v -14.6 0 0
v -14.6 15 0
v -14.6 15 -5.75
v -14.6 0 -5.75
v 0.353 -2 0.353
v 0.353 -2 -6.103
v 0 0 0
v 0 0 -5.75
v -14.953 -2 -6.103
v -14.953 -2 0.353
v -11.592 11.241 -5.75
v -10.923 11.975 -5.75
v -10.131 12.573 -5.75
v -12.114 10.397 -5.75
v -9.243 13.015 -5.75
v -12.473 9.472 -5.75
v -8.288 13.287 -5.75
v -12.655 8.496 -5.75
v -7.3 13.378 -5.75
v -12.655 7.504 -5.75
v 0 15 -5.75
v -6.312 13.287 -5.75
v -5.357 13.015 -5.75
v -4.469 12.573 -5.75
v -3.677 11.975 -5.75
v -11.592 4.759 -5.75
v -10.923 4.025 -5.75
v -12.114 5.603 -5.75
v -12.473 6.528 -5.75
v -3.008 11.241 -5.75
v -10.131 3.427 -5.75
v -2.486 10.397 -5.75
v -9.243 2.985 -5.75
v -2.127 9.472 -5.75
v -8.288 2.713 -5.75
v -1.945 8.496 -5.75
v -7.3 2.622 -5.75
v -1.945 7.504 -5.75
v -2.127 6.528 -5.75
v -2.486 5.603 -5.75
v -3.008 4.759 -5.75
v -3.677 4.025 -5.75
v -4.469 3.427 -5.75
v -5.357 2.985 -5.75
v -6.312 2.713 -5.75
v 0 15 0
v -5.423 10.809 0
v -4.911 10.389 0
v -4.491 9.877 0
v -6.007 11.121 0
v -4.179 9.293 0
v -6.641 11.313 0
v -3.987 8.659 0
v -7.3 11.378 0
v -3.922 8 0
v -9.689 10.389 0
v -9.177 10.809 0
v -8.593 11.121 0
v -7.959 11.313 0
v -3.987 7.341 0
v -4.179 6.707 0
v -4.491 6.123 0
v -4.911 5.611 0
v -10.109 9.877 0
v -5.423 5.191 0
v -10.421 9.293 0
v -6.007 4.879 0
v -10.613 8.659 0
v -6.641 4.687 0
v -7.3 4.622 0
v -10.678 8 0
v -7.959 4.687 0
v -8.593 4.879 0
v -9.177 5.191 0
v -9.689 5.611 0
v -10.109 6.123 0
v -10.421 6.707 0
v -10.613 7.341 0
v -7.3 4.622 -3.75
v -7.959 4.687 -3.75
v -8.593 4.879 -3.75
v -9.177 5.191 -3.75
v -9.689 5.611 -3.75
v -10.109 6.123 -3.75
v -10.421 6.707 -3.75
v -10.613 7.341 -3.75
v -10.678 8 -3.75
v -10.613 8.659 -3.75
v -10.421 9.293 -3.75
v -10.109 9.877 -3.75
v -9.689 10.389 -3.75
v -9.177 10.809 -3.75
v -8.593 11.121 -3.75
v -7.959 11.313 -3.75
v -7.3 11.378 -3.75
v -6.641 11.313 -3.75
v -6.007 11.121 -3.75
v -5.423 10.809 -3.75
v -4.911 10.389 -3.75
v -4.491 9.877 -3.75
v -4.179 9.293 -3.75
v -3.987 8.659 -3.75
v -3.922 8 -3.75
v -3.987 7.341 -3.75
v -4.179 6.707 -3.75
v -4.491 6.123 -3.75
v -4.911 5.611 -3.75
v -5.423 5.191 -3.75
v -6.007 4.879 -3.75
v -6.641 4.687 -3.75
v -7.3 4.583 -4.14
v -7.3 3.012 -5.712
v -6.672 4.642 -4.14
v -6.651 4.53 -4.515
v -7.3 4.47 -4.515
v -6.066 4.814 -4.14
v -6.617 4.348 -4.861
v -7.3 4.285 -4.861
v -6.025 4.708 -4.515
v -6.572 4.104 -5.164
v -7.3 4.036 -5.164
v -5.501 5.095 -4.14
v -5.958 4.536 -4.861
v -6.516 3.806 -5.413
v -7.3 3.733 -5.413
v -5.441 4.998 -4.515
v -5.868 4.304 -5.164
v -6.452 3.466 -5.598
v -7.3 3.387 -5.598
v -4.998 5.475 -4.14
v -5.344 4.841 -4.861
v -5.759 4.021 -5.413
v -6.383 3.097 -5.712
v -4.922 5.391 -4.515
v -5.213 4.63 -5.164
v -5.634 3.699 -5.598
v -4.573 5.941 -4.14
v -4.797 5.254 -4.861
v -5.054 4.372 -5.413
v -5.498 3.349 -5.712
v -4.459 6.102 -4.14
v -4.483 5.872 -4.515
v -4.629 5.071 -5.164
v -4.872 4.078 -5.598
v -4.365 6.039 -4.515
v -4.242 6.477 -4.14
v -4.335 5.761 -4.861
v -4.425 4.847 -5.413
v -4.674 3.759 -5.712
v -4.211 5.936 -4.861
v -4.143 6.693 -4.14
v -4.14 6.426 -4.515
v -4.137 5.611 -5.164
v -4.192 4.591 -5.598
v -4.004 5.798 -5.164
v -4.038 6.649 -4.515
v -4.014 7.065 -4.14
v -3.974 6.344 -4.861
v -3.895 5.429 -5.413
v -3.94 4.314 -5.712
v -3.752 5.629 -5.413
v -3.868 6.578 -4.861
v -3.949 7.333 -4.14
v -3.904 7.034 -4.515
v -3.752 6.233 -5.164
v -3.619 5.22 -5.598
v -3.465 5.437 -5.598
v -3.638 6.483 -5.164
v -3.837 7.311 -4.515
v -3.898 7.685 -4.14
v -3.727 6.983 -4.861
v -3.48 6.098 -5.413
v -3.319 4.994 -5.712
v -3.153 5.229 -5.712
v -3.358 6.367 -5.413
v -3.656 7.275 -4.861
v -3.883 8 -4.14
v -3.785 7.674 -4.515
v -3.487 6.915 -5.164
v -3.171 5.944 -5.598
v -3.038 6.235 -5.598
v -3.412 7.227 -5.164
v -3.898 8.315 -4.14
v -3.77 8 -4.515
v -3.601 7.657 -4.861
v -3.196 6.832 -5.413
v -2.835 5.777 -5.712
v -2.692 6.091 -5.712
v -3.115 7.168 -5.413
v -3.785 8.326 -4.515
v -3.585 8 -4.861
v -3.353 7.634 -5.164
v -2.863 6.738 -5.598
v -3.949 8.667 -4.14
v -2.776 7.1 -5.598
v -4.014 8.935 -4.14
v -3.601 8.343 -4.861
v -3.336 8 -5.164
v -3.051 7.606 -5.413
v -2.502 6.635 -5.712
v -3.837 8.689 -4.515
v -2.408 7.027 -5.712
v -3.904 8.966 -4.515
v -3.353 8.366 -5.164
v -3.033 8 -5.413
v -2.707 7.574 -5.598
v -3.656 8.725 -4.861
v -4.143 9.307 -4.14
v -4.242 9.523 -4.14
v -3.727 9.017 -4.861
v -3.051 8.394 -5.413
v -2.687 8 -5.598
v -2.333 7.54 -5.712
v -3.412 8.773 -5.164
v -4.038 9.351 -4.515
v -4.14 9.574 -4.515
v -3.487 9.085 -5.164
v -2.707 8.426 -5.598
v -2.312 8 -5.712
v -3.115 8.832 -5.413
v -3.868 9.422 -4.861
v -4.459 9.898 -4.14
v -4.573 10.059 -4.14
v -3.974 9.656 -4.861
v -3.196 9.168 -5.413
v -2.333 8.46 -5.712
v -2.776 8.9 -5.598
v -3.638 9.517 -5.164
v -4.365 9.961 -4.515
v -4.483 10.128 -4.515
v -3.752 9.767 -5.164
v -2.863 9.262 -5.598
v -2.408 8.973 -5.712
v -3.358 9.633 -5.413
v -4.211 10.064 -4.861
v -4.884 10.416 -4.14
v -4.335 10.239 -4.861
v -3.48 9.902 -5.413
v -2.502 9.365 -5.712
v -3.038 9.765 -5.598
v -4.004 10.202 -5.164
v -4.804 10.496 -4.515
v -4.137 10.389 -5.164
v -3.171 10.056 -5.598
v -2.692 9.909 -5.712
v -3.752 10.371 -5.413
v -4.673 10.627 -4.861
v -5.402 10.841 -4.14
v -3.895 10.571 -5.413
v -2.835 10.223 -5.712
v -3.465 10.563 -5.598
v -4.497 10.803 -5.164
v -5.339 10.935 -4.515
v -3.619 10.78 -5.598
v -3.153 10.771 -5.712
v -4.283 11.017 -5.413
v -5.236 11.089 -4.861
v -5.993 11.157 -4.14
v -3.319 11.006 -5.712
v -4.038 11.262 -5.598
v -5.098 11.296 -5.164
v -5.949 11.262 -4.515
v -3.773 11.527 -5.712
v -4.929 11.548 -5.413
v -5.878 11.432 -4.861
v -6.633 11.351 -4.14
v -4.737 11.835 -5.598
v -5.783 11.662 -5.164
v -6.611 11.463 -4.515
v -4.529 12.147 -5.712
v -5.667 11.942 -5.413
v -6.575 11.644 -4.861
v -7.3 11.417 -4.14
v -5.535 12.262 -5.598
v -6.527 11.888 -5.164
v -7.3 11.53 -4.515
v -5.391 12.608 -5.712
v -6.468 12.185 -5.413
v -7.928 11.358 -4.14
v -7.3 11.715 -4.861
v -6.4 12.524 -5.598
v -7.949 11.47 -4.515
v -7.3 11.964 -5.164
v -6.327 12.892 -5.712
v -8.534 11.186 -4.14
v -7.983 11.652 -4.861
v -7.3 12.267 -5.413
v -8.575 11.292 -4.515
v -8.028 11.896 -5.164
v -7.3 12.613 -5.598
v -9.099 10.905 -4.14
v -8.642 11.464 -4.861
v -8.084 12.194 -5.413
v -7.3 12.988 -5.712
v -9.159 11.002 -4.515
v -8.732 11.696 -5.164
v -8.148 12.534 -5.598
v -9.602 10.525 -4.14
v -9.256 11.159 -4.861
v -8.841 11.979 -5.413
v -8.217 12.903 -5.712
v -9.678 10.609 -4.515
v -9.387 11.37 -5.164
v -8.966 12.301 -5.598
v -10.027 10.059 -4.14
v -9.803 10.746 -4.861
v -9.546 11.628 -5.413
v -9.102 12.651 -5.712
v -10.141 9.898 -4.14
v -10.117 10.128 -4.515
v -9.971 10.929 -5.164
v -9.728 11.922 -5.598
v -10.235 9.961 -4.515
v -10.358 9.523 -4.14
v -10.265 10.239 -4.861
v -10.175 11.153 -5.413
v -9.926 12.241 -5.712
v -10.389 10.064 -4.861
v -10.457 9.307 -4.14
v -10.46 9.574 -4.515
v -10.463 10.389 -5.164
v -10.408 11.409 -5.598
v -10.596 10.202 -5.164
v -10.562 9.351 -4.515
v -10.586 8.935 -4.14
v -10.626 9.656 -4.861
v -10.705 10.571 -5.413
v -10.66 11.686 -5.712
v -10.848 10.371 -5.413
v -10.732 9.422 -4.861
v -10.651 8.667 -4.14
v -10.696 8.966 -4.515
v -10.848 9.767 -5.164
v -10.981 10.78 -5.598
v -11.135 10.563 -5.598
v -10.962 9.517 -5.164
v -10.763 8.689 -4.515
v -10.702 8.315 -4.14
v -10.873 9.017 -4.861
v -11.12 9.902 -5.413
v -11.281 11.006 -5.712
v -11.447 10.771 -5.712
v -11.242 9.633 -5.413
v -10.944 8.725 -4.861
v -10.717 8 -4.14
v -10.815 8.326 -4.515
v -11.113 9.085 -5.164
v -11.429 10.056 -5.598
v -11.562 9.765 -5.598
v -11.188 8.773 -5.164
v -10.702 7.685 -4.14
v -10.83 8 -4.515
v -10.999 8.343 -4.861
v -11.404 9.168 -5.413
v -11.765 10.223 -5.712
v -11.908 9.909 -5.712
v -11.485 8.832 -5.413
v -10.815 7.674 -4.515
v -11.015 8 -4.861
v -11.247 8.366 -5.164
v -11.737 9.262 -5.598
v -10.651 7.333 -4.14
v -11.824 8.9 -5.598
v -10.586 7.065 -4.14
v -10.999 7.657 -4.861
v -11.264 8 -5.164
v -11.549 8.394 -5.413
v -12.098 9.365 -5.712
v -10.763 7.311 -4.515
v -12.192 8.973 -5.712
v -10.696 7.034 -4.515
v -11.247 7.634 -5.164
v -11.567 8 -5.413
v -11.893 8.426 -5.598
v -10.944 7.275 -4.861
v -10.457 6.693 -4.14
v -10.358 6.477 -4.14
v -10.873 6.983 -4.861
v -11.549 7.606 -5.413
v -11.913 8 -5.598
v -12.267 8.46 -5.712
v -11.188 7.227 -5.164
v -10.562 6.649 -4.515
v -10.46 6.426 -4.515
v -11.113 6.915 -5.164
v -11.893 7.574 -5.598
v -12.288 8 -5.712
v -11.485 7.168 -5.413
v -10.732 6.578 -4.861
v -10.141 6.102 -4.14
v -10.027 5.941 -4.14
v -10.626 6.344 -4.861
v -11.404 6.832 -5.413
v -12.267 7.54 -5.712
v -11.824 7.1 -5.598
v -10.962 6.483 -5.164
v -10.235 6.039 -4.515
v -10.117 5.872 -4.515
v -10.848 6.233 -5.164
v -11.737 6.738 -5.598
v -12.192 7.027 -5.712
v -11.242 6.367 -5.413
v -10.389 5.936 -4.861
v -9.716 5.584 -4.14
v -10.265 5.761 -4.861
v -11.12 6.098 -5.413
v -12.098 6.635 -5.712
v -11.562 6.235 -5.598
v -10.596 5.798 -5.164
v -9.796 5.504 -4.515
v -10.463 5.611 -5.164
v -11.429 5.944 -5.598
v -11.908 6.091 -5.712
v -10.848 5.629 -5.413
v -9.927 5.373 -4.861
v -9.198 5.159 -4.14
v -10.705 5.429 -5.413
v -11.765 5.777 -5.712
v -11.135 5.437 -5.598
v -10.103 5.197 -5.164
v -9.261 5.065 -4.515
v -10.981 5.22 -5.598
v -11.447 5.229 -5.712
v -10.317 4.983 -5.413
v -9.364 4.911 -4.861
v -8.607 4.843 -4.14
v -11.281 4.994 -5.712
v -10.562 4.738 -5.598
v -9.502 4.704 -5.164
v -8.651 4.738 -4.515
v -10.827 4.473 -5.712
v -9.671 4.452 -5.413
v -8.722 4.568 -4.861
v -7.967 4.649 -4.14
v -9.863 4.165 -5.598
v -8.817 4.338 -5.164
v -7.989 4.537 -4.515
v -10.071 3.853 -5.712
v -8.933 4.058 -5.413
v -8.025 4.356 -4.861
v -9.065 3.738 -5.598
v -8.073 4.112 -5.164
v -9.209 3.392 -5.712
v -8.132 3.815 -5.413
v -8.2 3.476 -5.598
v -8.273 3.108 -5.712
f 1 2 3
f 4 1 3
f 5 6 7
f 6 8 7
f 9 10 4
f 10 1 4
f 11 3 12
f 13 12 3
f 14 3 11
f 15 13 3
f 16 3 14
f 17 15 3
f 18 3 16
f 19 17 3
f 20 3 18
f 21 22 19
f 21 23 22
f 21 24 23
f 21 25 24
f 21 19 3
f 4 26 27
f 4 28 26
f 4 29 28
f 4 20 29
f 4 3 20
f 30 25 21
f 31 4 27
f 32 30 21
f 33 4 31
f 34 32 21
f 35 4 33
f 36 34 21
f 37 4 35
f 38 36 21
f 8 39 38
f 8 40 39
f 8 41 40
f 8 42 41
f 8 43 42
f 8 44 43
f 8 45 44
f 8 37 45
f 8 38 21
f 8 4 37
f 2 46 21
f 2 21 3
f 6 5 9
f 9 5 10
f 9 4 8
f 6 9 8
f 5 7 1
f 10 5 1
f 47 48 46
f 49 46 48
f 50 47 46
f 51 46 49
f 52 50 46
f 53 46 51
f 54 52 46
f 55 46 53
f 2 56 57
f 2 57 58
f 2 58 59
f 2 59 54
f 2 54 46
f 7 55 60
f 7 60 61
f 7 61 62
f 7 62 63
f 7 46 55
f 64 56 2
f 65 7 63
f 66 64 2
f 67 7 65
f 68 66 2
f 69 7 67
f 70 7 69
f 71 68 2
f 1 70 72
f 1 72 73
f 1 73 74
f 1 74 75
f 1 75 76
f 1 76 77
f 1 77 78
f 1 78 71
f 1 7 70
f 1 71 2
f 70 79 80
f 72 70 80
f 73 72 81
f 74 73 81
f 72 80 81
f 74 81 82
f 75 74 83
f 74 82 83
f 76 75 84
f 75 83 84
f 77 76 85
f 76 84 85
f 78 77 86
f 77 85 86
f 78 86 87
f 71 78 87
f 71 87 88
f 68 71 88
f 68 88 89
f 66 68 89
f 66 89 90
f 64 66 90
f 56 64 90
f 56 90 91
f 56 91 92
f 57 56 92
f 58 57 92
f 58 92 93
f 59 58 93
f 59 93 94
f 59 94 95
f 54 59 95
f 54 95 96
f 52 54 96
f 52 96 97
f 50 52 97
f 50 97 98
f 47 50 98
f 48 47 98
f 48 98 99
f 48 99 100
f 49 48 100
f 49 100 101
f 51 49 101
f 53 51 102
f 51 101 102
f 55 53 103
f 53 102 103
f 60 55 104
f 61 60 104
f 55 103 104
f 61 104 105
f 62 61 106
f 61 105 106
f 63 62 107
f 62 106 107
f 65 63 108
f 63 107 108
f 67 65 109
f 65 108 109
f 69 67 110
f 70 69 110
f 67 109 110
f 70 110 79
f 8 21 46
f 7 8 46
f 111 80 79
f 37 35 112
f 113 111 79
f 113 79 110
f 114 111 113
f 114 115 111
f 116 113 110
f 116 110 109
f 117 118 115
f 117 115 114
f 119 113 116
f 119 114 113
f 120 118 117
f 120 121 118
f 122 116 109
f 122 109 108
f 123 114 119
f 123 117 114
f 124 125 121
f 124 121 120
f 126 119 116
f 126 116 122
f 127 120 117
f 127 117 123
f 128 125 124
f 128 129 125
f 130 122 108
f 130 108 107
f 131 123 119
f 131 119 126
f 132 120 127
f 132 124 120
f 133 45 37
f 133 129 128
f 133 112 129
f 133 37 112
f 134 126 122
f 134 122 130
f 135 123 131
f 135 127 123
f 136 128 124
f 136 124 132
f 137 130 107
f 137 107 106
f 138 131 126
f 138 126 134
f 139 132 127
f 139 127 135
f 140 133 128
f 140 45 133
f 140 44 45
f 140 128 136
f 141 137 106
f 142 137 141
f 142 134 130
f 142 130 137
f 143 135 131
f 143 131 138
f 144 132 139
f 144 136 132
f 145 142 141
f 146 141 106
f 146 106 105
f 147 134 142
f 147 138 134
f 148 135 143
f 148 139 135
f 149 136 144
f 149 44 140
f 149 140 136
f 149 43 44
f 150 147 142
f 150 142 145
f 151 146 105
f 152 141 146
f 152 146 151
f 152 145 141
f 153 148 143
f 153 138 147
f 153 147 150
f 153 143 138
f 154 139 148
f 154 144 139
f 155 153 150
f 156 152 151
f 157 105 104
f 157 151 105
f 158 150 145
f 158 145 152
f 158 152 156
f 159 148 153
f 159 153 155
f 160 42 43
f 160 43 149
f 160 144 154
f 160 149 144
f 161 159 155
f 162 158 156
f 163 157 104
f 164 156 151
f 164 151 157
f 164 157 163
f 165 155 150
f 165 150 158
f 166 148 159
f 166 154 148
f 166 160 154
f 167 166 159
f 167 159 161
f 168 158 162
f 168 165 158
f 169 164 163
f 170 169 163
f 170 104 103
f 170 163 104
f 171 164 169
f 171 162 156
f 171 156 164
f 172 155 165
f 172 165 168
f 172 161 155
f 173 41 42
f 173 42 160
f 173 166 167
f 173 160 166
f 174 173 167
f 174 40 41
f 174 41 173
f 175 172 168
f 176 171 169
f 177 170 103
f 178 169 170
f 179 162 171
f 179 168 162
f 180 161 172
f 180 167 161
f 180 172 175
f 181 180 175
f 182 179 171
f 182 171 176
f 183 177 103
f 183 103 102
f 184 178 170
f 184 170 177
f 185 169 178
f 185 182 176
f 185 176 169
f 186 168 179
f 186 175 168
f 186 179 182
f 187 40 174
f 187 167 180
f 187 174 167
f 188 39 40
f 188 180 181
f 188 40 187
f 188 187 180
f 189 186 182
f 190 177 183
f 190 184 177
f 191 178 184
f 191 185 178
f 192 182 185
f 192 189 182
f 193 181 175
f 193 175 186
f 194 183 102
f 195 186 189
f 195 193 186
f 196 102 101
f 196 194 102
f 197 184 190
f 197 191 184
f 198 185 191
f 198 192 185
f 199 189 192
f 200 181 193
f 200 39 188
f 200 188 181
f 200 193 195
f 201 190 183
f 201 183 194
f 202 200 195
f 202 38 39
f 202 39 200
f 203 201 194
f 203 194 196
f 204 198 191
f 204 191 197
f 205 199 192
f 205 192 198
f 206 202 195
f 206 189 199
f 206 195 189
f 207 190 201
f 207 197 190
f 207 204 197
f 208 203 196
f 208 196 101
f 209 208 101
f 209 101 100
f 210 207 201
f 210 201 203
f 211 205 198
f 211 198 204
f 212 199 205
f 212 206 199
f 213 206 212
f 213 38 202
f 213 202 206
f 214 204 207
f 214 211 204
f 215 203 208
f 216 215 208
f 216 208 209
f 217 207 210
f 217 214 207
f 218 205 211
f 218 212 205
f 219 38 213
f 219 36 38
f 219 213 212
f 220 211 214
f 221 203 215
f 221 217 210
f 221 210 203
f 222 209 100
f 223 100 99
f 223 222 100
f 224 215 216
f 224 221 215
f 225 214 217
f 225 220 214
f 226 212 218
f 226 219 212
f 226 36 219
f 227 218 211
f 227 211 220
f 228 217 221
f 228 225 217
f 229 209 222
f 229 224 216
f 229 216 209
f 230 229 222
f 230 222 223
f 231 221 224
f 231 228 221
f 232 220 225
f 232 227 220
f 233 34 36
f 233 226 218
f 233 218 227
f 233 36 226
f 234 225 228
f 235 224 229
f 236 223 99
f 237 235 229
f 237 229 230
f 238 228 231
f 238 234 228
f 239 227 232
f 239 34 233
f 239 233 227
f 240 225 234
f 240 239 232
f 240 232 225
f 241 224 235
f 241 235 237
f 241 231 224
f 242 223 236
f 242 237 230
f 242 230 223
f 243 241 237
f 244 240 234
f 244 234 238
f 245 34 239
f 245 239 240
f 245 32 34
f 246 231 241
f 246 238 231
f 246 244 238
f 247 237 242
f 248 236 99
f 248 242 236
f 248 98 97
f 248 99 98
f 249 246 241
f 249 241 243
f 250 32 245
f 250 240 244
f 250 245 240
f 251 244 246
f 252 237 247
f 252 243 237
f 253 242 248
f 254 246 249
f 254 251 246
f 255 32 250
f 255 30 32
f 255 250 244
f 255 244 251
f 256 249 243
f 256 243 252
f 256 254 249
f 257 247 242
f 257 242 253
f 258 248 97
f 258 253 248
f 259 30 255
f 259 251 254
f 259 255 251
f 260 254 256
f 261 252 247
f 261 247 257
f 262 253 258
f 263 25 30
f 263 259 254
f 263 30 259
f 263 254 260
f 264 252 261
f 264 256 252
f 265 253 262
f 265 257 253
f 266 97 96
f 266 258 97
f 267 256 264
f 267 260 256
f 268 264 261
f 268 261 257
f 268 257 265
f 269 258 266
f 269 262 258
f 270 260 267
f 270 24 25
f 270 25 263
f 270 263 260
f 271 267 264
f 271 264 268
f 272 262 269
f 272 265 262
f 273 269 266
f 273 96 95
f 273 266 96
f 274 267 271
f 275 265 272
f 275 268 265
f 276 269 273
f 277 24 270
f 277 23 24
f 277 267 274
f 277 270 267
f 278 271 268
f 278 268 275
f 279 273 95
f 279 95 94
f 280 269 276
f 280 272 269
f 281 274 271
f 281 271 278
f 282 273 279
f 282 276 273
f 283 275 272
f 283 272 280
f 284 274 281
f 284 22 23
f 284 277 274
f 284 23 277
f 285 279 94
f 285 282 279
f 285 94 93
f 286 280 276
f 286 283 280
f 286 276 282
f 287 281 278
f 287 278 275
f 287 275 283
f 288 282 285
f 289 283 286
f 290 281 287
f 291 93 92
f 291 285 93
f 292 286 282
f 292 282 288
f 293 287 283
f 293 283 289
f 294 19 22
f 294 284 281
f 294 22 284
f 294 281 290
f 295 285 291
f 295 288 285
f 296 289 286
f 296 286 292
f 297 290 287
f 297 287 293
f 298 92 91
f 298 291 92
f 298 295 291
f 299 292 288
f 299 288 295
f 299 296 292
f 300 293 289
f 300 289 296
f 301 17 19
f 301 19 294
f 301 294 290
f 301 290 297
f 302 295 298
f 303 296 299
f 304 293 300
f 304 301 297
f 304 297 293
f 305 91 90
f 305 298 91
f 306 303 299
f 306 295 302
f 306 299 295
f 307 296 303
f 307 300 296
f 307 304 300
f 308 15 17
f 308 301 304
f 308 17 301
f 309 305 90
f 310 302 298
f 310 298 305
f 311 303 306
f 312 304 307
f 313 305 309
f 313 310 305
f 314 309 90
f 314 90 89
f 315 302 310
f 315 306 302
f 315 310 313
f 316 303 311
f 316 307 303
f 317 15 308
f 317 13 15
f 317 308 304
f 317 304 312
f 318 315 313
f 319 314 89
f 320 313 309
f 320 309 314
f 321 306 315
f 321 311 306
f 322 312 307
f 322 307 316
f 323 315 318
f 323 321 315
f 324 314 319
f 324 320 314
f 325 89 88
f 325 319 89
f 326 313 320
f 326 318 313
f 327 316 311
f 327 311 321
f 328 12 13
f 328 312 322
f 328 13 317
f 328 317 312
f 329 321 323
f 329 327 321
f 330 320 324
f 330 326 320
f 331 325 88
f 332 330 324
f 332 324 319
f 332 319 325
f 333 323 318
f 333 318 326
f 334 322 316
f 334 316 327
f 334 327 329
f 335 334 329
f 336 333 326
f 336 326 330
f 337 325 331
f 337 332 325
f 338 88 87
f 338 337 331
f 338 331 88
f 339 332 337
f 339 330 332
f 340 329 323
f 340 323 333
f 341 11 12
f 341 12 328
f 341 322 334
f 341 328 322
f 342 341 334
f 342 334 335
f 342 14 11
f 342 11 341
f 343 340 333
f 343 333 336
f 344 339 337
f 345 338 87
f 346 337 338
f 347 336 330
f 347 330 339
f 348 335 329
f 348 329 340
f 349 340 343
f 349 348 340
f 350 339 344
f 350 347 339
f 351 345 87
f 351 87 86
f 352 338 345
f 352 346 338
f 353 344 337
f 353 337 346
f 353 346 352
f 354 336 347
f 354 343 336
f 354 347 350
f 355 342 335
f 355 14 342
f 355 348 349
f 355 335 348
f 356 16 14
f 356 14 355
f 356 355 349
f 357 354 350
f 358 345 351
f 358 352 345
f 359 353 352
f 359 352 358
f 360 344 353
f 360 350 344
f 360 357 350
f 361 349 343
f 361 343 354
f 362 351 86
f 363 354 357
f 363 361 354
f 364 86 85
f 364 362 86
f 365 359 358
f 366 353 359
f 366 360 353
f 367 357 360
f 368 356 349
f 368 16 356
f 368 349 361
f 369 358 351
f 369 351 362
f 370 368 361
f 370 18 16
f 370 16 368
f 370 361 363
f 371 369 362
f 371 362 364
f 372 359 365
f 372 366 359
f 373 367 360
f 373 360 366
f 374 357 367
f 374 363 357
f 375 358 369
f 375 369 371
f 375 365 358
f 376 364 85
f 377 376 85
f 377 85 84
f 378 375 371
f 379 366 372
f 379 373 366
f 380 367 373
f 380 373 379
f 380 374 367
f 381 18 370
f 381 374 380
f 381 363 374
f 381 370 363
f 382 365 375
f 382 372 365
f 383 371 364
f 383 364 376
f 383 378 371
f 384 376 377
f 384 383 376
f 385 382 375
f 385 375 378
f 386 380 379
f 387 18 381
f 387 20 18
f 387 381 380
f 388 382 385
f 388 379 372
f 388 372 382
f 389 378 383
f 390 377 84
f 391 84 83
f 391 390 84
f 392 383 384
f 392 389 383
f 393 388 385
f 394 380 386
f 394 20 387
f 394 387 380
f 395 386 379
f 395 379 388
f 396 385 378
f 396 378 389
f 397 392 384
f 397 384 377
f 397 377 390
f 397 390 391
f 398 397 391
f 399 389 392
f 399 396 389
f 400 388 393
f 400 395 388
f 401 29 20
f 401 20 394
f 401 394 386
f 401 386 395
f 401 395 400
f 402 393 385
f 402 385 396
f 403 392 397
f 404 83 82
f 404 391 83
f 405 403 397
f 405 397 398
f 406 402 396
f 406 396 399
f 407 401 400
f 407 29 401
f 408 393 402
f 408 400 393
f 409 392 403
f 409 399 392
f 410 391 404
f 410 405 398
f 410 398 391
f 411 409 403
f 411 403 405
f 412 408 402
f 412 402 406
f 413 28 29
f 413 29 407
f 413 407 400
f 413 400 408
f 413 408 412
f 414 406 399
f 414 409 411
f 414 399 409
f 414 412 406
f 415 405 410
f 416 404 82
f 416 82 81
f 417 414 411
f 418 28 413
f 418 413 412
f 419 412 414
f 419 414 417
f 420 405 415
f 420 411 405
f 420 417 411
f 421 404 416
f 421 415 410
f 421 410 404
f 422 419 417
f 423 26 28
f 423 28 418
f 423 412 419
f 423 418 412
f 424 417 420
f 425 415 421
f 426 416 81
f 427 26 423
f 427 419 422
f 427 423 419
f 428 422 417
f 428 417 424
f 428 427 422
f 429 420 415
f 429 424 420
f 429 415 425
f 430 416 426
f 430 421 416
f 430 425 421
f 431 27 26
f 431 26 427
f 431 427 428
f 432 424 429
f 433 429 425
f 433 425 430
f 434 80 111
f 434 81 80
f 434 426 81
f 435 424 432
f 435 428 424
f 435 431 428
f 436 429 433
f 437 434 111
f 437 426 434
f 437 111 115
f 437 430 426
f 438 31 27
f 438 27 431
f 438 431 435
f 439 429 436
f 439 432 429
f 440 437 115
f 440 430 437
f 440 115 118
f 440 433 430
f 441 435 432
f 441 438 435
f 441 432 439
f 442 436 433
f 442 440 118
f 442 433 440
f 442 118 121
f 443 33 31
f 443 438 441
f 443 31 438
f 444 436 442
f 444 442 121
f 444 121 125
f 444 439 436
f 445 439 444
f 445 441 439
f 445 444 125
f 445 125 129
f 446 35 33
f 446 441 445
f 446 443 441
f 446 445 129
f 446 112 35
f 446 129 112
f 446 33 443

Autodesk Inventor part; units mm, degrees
ref_plane "YZ Plane" through (0, 0, 0) normal (1, 0, 0) x (0, 1, 0)
ref_plane "XZ Plane" through (0, 0, 0) normal (0, 1, 0) x (-1, 0, 0)
ref_plane "XY Plane" through (0, 0, 0) normal (0, 0, 1) x (1, 0, 0)
sketch "Sketch1" plane through (0, 0, 0) normal (0, 1, 0) x (-1, 0, 0)
  point P0 (0, 0)
sketch "Sketch2" plane through (0, 0, 0) normal (0, 1, 0) x (-1, 0, 0)
  line L0 (0, 0) -> (14.6, 0)
  line L1 (14.6, 0) -> (14.6, -5.75)
  line L2 (14.6, -5.75) -> (0, -5.75)
  line L3 (0, -5.75) -> (0, 0)
  dimension "d0" = 14.6
  dimension "d1" = 5.75
extrude "Extrusion1" add sketch "Sketch2" along normal blind 15 and the other way blind 2 draft 10
sketch "Sketch3" plane through (-14.6, 0, 0) normal (0, 0, 1) x (1, 0, 0)
  line L0 (0, 15) -> (14.6, 15) projected
  point P0 (14.6, 0)
  point P1 (7.3, 8)
  point P2 (7.3, 15)
  dimension "d6" = 7
hole "Hole1" at (-7.3, 8, 0) direction (0, 0, -1) diameter 6.7564 depth 12.7 tip angle 118 clearance for "Flat Head Machine Screw (82)" size "1/4" standard "Ansi Unified Screw Threads"
fillet "Fillet1" radius 2 1 edges at (-7.3, 11.3782, -5.75)
properties part number "Support Hole"
